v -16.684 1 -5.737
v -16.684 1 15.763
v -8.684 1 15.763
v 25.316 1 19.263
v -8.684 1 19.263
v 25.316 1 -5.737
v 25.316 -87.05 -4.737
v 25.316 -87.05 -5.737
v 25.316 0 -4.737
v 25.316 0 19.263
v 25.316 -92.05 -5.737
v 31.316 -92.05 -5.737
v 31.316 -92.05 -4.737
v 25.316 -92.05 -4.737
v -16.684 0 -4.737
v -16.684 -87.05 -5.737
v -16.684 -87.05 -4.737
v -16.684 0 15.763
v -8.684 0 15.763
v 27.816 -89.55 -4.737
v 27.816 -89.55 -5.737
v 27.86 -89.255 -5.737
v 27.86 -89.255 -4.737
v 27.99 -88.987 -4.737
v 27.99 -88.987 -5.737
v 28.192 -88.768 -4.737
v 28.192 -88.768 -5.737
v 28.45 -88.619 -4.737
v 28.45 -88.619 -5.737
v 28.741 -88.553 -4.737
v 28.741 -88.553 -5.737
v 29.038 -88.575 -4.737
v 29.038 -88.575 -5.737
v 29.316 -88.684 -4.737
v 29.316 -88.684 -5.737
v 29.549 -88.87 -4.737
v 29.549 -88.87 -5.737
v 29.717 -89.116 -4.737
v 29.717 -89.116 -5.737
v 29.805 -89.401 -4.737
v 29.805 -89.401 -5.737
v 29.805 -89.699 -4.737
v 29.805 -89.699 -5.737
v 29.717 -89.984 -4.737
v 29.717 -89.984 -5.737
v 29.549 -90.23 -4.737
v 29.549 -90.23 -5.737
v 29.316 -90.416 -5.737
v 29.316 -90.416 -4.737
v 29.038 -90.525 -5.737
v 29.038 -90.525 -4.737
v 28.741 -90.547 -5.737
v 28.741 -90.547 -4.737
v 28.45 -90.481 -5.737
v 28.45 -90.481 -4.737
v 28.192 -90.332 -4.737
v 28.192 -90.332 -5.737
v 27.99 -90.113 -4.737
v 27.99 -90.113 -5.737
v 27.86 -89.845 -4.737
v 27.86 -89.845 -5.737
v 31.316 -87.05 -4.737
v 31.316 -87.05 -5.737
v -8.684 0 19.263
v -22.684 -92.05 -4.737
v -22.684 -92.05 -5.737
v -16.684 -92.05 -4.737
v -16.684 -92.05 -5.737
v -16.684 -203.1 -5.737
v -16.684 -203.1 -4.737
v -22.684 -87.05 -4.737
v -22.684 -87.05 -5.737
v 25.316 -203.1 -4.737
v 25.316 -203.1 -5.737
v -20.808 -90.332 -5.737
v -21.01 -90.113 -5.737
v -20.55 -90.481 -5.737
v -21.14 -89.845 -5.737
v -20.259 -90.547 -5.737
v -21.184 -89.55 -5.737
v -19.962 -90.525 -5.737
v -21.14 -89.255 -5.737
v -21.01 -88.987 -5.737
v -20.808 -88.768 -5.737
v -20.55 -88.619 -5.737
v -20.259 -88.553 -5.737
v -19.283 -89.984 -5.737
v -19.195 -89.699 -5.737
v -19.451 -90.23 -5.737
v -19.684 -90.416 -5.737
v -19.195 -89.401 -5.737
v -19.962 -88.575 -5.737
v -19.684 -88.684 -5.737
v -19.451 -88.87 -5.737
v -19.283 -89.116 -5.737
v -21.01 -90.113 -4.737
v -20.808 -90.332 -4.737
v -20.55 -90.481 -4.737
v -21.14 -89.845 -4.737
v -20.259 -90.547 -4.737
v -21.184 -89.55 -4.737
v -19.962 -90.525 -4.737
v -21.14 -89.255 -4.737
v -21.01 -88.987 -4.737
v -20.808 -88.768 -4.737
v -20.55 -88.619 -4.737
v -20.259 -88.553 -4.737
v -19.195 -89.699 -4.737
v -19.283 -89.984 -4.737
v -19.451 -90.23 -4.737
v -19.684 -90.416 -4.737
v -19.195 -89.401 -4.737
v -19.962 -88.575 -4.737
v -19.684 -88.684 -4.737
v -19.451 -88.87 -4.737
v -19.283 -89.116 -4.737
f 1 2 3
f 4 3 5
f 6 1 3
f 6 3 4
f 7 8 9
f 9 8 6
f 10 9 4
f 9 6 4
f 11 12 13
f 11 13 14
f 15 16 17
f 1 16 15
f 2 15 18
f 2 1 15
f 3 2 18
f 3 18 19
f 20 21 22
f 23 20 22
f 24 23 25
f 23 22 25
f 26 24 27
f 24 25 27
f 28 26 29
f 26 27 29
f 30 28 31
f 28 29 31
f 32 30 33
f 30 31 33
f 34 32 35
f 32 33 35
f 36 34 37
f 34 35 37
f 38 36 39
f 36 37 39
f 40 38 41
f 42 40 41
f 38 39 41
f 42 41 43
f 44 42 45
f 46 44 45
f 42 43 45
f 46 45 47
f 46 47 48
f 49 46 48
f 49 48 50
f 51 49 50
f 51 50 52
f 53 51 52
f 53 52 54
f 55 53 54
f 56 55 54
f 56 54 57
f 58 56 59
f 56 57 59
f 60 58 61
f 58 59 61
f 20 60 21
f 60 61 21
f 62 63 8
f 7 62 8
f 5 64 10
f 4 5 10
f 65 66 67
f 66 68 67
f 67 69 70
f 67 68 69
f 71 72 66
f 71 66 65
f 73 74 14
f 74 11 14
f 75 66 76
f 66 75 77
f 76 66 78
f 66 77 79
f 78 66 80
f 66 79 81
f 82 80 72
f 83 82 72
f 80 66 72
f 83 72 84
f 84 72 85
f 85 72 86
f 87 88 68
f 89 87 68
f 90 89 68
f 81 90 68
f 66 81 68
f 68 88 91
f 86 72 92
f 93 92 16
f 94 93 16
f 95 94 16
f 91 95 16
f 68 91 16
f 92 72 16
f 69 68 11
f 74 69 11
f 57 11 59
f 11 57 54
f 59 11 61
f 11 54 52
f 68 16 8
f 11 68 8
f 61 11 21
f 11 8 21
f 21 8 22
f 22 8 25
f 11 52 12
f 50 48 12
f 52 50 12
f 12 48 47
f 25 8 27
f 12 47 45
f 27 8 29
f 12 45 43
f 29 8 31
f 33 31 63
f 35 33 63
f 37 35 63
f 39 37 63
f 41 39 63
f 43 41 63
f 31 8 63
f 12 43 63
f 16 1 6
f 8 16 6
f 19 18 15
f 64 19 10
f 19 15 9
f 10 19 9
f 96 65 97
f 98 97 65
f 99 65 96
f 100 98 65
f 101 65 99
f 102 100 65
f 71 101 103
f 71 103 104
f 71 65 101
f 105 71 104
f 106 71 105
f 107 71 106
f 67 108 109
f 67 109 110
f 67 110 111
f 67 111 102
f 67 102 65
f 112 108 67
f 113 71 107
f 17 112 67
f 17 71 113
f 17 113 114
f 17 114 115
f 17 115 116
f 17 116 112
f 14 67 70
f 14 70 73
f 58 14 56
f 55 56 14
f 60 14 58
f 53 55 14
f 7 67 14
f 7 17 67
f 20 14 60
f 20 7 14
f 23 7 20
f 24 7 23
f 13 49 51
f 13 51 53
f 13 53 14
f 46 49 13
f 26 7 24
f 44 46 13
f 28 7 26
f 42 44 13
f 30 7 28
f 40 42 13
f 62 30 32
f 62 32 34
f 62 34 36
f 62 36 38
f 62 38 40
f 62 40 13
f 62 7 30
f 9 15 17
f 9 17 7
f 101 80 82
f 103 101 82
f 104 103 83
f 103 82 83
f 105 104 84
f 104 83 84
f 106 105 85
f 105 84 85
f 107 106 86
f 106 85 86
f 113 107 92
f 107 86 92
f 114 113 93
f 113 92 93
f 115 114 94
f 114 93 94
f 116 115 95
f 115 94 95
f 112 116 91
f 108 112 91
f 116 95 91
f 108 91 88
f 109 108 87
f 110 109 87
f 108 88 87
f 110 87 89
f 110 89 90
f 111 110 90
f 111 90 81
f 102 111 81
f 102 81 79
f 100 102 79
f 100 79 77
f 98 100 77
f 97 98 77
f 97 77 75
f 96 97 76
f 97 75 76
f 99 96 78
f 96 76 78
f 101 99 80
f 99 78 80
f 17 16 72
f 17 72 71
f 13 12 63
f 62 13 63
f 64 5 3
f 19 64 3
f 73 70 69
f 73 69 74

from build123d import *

# Parameters (mm, degrees)
SKETCH1_W            = 42
SKETCH1_H            = 25
BOSS_EXTRUDE1_DEPTH  = 1
SKETCH2_W            = 42
SKETCH2_H            = 1
BOSS_EXTRUDE2_DEPTH  = 179
SKETCH3_W            = 42
SKETCH3_H            = 1
BOSS_EXTRUDE3_DEPTH  = 2.1
SKETCH4_W            = 42
SKETCH4_H            = 1
BOSS_EXTRUDE4_DEPTH  = 15
SKETCH6_R            = 1.25
CUT_EXTRUDE1_DEPTH   = 15
SKETCH7_W            = 42
SKETCH7_H            = 1.67
CUT_EXTRUDE2_DEPTH   = 15
SKETCH8_W            = 8
SKETCH8_H            = 3.5
CUT_EXTRUDE3_DEPTH   = 15
SKETCH9_W            = 42
SKETCH9_H            = 14.33
CUT_EXTRUDE4_DEPTH   = 10
SKETCH10_W           = 5
SKETCH10_H           = 6
BOSS_EXTRUDE5_DEPTH  = 1
SKETCH11_R           = 1
CUT_EXTRUDE5_DEPTH   = 1
SKETCH12_W           = 42
SKETCH12_H           = 1
BOSS_EXTRUDE6_DEPTH  = 9
SKETCH13_W           = 5
SKETCH13_H           = 6
BOSS_EXTRUDE8_DEPTH  = 1
SKETCH15_R           = 1
CUT_EXTRUDE7_DEPTH   = 1
SKETCH16_W           = 6
SKETCH16_H           = 5
BOSS_EXTRUDE9_DEPTH  = 1
SKETCH17_W           = 53
SKETCH17_H           = 5
BOSS_EXTRUDE10_DEPTH = 1
SKETCH18_R           = 1
CUT_EXTRUDE8_DEPTH   = 1
SKETCH20_W           = 1
SKETCH20_H           = 5
BOSS_EXTRUDE11_DEPTH = 1
SKETCH21_R           = 1
CUT_EXTRUDE9_DEPTH   = 1
SKETCH22_W           = 42
SKETCH22_H           = 1
BOSS_EXTRUDE13_DEPTH = 24


with BuildPart() as part:
    # Sketch1 → Boss-Extrude1 (new body)
    with BuildSketch(Plane(origin=(0, 0, 0), x_dir=(1, 0, 0), z_dir=(0, 1, 0))):
        with Locations((4.315789474, -6.763157895)):
            Rectangle(SKETCH1_W, SKETCH1_H)
    extrude(amount=BOSS_EXTRUDE1_DEPTH)

    # Sketch2 → Boss-Extrude2 (add)
    with BuildSketch(Plane(origin=(0, 1, 0), x_dir=(1, 0, 0), z_dir=(0, 1, 0))):
        with Locations((4.315789474, 5.236842105)):
            Rectangle(SKETCH2_W, SKETCH2_H)
    extrude(amount=-BOSS_EXTRUDE2_DEPTH)

    # Sketch3 → Boss-Extrude3 (add)
    with BuildSketch(Plane.XZ.offset(178)):
        with Locations((4.315789474, -5.236842105)):
            Rectangle(SKETCH3_W, SKETCH3_H)
    extrude(amount=BOSS_EXTRUDE3_DEPTH)

    # Sketch4 → Boss-Extrude4 (add)
    with BuildSketch(Plane.XY.offset(-4.736842105)):
        with Locations((4.315789474, -179.6)):
            Rectangle(SKETCH4_W, SKETCH4_H)
    extrude(amount=BOSS_EXTRUDE4_DEPTH)

    # Sketch6 → Cut-Extrude1 (cut)
    with BuildSketch(Plane.XZ.offset(180.1)):
        with Locations((-6.684210526, 3.593157895)):
            Circle(SKETCH6_R)
        with Locations((15.315789474, 3.593157895)):
            Circle(SKETCH6_R)
    extrude(amount=-CUT_EXTRUDE1_DEPTH, mode=Mode.SUBTRACT)

    # Sketch7 → Cut-Extrude2 (cut)
    with BuildSketch(Plane.XZ.offset(180.1)):
        with Locations((4.315789474, 9.428157895)):
            Rectangle(SKETCH7_W, SKETCH7_H)
    extrude(amount=-CUT_EXTRUDE2_DEPTH, mode=Mode.SUBTRACT)

    # Sketch8 → Cut-Extrude3 (cut)
    with BuildSketch(Plane(origin=(0, 1, 0), x_dir=(1, 0, 0), z_dir=(0, 1, 0))):
        with Locations((-12.684210526, -17.513157895)):
            Rectangle(SKETCH8_W, SKETCH8_H)
    extrude(amount=-CUT_EXTRUDE3_DEPTH, mode=Mode.SUBTRACT)

    # Sketch9 → Cut-Extrude4 (cut)
    with BuildSketch(Plane.XZ.offset(180.1)):
        with Locations((4.315789474, 1.428157895)):
            Rectangle(SKETCH9_W, SKETCH9_H)
    extrude(amount=-CUT_EXTRUDE4_DEPTH, mode=Mode.SUBTRACT)

    # Sketch10 → Boss-Extrude5 (add)
    with BuildSketch(Plane(origin=(0, 0, -5.736842105), x_dir=(-1, 0, 0), z_dir=(0, 0, -1))):
        with Locations((-4.315789474, -173.1)):
            Rectangle(SKETCH10_W, SKETCH10_H)
    extrude(amount=-BOSS_EXTRUDE5_DEPTH)

    # Sketch11 → Cut-Extrude5 (cut)
    with BuildSketch(Plane(origin=(0, 0, -5.736842105), x_dir=(-1, 0, 0), z_dir=(0, 0, -1))):
        with Locations((-4.315789474, -173.6)):
            Circle(SKETCH11_R)
    extrude(amount=-CUT_EXTRUDE5_DEPTH, mode=Mode.SUBTRACT)

    # Sketch12 → Boss-Extrude6 (add)
    with BuildSketch(Plane.XZ.offset(170.1)):
        with Locations((4.315789474, -5.236842105)):
            Rectangle(SKETCH12_W, SKETCH12_H)
    extrude(amount=BOSS_EXTRUDE6_DEPTH)

    # Sketch13 → Boss-Extrude8 (add)
    with BuildSketch(Plane(origin=(0, 0, -5.736842105), x_dir=(-1, 0, 0), z_dir=(0, 0, -1))):
        with Locations((-4.315789474, -182.1)):
            Rectangle(SKETCH13_W, SKETCH13_H)
    extrude(amount=-BOSS_EXTRUDE8_DEPTH)

    # Sketch15 → Cut-Extrude7 (cut)
    with BuildSketch(Plane(origin=(0, 0, -5.736842105), x_dir=(-1, 0, 0), z_dir=(0, 0, -1))):
        with Locations((-4.315789474, -182.6)):
            Circle(SKETCH15_R)
    extrude(amount=-CUT_EXTRUDE7_DEPTH, mode=Mode.SUBTRACT)

    # Sketch16 → Boss-Extrude9 (add)
    with BuildSketch(Plane(origin=(0, 0, -5.736842105), x_dir=(-1, 0, 0), z_dir=(0, 0, -1))):
        with Locations((-28.315789474, -89.55)):
            Rectangle(SKETCH16_W, SKETCH16_H)
    extrude(amount=-BOSS_EXTRUDE9_DEPTH)

    # Sketch17 → Boss-Extrude10 (add)
    with BuildSketch(Plane(origin=(0, 0, -5.736842105), x_dir=(-1, 0, 0), z_dir=(0, 0, -1))):
        with Locations((-4.815789474, -89.55)):
            Rectangle(SKETCH17_W, SKETCH17_H)
    extrude(amount=-BOSS_EXTRUDE10_DEPTH)

    # Sketch18 → Cut-Extrude8 (cut)
    with BuildSketch(Plane(origin=(0, 0, -5.736842105), x_dir=(-1, 0, 0), z_dir=(0, 0, -1))):
        with Locations((-28.815789474, -89.55)):
            Circle(SKETCH18_R)
    extrude(amount=-CUT_EXTRUDE8_DEPTH, mode=Mode.SUBTRACT)

    # Sketch20 → Boss-Extrude11 (add)
    with BuildSketch(Plane.ZY.offset(21.684210526)):
        with Locations((-5.236842105, -89.55)):
            Rectangle(SKETCH20_W, SKETCH20_H)
    extrude(amount=BOSS_EXTRUDE11_DEPTH)

    # Sketch21 → Cut-Extrude9 (cut)
    with BuildSketch(Plane(origin=(0, 0, -5.736842105), x_dir=(-1, 0, 0), z_dir=(0, 0, -1))):
        with Locations((20.184210526, -89.55)):
            Circle(SKETCH21_R)
    extrude(amount=-CUT_EXTRUDE9_DEPTH, mode=Mode.SUBTRACT)

    # Sketch22 → Boss-Extrude13 (add)
    with BuildSketch(Plane.XZ.offset(179.1)):
        with Locations((4.315789474, -5.236842105)):
            Rectangle(SKETCH22_W, SKETCH22_H)
    extrude(amount=BOSS_EXTRUDE13_DEPTH)


solid = part.part
